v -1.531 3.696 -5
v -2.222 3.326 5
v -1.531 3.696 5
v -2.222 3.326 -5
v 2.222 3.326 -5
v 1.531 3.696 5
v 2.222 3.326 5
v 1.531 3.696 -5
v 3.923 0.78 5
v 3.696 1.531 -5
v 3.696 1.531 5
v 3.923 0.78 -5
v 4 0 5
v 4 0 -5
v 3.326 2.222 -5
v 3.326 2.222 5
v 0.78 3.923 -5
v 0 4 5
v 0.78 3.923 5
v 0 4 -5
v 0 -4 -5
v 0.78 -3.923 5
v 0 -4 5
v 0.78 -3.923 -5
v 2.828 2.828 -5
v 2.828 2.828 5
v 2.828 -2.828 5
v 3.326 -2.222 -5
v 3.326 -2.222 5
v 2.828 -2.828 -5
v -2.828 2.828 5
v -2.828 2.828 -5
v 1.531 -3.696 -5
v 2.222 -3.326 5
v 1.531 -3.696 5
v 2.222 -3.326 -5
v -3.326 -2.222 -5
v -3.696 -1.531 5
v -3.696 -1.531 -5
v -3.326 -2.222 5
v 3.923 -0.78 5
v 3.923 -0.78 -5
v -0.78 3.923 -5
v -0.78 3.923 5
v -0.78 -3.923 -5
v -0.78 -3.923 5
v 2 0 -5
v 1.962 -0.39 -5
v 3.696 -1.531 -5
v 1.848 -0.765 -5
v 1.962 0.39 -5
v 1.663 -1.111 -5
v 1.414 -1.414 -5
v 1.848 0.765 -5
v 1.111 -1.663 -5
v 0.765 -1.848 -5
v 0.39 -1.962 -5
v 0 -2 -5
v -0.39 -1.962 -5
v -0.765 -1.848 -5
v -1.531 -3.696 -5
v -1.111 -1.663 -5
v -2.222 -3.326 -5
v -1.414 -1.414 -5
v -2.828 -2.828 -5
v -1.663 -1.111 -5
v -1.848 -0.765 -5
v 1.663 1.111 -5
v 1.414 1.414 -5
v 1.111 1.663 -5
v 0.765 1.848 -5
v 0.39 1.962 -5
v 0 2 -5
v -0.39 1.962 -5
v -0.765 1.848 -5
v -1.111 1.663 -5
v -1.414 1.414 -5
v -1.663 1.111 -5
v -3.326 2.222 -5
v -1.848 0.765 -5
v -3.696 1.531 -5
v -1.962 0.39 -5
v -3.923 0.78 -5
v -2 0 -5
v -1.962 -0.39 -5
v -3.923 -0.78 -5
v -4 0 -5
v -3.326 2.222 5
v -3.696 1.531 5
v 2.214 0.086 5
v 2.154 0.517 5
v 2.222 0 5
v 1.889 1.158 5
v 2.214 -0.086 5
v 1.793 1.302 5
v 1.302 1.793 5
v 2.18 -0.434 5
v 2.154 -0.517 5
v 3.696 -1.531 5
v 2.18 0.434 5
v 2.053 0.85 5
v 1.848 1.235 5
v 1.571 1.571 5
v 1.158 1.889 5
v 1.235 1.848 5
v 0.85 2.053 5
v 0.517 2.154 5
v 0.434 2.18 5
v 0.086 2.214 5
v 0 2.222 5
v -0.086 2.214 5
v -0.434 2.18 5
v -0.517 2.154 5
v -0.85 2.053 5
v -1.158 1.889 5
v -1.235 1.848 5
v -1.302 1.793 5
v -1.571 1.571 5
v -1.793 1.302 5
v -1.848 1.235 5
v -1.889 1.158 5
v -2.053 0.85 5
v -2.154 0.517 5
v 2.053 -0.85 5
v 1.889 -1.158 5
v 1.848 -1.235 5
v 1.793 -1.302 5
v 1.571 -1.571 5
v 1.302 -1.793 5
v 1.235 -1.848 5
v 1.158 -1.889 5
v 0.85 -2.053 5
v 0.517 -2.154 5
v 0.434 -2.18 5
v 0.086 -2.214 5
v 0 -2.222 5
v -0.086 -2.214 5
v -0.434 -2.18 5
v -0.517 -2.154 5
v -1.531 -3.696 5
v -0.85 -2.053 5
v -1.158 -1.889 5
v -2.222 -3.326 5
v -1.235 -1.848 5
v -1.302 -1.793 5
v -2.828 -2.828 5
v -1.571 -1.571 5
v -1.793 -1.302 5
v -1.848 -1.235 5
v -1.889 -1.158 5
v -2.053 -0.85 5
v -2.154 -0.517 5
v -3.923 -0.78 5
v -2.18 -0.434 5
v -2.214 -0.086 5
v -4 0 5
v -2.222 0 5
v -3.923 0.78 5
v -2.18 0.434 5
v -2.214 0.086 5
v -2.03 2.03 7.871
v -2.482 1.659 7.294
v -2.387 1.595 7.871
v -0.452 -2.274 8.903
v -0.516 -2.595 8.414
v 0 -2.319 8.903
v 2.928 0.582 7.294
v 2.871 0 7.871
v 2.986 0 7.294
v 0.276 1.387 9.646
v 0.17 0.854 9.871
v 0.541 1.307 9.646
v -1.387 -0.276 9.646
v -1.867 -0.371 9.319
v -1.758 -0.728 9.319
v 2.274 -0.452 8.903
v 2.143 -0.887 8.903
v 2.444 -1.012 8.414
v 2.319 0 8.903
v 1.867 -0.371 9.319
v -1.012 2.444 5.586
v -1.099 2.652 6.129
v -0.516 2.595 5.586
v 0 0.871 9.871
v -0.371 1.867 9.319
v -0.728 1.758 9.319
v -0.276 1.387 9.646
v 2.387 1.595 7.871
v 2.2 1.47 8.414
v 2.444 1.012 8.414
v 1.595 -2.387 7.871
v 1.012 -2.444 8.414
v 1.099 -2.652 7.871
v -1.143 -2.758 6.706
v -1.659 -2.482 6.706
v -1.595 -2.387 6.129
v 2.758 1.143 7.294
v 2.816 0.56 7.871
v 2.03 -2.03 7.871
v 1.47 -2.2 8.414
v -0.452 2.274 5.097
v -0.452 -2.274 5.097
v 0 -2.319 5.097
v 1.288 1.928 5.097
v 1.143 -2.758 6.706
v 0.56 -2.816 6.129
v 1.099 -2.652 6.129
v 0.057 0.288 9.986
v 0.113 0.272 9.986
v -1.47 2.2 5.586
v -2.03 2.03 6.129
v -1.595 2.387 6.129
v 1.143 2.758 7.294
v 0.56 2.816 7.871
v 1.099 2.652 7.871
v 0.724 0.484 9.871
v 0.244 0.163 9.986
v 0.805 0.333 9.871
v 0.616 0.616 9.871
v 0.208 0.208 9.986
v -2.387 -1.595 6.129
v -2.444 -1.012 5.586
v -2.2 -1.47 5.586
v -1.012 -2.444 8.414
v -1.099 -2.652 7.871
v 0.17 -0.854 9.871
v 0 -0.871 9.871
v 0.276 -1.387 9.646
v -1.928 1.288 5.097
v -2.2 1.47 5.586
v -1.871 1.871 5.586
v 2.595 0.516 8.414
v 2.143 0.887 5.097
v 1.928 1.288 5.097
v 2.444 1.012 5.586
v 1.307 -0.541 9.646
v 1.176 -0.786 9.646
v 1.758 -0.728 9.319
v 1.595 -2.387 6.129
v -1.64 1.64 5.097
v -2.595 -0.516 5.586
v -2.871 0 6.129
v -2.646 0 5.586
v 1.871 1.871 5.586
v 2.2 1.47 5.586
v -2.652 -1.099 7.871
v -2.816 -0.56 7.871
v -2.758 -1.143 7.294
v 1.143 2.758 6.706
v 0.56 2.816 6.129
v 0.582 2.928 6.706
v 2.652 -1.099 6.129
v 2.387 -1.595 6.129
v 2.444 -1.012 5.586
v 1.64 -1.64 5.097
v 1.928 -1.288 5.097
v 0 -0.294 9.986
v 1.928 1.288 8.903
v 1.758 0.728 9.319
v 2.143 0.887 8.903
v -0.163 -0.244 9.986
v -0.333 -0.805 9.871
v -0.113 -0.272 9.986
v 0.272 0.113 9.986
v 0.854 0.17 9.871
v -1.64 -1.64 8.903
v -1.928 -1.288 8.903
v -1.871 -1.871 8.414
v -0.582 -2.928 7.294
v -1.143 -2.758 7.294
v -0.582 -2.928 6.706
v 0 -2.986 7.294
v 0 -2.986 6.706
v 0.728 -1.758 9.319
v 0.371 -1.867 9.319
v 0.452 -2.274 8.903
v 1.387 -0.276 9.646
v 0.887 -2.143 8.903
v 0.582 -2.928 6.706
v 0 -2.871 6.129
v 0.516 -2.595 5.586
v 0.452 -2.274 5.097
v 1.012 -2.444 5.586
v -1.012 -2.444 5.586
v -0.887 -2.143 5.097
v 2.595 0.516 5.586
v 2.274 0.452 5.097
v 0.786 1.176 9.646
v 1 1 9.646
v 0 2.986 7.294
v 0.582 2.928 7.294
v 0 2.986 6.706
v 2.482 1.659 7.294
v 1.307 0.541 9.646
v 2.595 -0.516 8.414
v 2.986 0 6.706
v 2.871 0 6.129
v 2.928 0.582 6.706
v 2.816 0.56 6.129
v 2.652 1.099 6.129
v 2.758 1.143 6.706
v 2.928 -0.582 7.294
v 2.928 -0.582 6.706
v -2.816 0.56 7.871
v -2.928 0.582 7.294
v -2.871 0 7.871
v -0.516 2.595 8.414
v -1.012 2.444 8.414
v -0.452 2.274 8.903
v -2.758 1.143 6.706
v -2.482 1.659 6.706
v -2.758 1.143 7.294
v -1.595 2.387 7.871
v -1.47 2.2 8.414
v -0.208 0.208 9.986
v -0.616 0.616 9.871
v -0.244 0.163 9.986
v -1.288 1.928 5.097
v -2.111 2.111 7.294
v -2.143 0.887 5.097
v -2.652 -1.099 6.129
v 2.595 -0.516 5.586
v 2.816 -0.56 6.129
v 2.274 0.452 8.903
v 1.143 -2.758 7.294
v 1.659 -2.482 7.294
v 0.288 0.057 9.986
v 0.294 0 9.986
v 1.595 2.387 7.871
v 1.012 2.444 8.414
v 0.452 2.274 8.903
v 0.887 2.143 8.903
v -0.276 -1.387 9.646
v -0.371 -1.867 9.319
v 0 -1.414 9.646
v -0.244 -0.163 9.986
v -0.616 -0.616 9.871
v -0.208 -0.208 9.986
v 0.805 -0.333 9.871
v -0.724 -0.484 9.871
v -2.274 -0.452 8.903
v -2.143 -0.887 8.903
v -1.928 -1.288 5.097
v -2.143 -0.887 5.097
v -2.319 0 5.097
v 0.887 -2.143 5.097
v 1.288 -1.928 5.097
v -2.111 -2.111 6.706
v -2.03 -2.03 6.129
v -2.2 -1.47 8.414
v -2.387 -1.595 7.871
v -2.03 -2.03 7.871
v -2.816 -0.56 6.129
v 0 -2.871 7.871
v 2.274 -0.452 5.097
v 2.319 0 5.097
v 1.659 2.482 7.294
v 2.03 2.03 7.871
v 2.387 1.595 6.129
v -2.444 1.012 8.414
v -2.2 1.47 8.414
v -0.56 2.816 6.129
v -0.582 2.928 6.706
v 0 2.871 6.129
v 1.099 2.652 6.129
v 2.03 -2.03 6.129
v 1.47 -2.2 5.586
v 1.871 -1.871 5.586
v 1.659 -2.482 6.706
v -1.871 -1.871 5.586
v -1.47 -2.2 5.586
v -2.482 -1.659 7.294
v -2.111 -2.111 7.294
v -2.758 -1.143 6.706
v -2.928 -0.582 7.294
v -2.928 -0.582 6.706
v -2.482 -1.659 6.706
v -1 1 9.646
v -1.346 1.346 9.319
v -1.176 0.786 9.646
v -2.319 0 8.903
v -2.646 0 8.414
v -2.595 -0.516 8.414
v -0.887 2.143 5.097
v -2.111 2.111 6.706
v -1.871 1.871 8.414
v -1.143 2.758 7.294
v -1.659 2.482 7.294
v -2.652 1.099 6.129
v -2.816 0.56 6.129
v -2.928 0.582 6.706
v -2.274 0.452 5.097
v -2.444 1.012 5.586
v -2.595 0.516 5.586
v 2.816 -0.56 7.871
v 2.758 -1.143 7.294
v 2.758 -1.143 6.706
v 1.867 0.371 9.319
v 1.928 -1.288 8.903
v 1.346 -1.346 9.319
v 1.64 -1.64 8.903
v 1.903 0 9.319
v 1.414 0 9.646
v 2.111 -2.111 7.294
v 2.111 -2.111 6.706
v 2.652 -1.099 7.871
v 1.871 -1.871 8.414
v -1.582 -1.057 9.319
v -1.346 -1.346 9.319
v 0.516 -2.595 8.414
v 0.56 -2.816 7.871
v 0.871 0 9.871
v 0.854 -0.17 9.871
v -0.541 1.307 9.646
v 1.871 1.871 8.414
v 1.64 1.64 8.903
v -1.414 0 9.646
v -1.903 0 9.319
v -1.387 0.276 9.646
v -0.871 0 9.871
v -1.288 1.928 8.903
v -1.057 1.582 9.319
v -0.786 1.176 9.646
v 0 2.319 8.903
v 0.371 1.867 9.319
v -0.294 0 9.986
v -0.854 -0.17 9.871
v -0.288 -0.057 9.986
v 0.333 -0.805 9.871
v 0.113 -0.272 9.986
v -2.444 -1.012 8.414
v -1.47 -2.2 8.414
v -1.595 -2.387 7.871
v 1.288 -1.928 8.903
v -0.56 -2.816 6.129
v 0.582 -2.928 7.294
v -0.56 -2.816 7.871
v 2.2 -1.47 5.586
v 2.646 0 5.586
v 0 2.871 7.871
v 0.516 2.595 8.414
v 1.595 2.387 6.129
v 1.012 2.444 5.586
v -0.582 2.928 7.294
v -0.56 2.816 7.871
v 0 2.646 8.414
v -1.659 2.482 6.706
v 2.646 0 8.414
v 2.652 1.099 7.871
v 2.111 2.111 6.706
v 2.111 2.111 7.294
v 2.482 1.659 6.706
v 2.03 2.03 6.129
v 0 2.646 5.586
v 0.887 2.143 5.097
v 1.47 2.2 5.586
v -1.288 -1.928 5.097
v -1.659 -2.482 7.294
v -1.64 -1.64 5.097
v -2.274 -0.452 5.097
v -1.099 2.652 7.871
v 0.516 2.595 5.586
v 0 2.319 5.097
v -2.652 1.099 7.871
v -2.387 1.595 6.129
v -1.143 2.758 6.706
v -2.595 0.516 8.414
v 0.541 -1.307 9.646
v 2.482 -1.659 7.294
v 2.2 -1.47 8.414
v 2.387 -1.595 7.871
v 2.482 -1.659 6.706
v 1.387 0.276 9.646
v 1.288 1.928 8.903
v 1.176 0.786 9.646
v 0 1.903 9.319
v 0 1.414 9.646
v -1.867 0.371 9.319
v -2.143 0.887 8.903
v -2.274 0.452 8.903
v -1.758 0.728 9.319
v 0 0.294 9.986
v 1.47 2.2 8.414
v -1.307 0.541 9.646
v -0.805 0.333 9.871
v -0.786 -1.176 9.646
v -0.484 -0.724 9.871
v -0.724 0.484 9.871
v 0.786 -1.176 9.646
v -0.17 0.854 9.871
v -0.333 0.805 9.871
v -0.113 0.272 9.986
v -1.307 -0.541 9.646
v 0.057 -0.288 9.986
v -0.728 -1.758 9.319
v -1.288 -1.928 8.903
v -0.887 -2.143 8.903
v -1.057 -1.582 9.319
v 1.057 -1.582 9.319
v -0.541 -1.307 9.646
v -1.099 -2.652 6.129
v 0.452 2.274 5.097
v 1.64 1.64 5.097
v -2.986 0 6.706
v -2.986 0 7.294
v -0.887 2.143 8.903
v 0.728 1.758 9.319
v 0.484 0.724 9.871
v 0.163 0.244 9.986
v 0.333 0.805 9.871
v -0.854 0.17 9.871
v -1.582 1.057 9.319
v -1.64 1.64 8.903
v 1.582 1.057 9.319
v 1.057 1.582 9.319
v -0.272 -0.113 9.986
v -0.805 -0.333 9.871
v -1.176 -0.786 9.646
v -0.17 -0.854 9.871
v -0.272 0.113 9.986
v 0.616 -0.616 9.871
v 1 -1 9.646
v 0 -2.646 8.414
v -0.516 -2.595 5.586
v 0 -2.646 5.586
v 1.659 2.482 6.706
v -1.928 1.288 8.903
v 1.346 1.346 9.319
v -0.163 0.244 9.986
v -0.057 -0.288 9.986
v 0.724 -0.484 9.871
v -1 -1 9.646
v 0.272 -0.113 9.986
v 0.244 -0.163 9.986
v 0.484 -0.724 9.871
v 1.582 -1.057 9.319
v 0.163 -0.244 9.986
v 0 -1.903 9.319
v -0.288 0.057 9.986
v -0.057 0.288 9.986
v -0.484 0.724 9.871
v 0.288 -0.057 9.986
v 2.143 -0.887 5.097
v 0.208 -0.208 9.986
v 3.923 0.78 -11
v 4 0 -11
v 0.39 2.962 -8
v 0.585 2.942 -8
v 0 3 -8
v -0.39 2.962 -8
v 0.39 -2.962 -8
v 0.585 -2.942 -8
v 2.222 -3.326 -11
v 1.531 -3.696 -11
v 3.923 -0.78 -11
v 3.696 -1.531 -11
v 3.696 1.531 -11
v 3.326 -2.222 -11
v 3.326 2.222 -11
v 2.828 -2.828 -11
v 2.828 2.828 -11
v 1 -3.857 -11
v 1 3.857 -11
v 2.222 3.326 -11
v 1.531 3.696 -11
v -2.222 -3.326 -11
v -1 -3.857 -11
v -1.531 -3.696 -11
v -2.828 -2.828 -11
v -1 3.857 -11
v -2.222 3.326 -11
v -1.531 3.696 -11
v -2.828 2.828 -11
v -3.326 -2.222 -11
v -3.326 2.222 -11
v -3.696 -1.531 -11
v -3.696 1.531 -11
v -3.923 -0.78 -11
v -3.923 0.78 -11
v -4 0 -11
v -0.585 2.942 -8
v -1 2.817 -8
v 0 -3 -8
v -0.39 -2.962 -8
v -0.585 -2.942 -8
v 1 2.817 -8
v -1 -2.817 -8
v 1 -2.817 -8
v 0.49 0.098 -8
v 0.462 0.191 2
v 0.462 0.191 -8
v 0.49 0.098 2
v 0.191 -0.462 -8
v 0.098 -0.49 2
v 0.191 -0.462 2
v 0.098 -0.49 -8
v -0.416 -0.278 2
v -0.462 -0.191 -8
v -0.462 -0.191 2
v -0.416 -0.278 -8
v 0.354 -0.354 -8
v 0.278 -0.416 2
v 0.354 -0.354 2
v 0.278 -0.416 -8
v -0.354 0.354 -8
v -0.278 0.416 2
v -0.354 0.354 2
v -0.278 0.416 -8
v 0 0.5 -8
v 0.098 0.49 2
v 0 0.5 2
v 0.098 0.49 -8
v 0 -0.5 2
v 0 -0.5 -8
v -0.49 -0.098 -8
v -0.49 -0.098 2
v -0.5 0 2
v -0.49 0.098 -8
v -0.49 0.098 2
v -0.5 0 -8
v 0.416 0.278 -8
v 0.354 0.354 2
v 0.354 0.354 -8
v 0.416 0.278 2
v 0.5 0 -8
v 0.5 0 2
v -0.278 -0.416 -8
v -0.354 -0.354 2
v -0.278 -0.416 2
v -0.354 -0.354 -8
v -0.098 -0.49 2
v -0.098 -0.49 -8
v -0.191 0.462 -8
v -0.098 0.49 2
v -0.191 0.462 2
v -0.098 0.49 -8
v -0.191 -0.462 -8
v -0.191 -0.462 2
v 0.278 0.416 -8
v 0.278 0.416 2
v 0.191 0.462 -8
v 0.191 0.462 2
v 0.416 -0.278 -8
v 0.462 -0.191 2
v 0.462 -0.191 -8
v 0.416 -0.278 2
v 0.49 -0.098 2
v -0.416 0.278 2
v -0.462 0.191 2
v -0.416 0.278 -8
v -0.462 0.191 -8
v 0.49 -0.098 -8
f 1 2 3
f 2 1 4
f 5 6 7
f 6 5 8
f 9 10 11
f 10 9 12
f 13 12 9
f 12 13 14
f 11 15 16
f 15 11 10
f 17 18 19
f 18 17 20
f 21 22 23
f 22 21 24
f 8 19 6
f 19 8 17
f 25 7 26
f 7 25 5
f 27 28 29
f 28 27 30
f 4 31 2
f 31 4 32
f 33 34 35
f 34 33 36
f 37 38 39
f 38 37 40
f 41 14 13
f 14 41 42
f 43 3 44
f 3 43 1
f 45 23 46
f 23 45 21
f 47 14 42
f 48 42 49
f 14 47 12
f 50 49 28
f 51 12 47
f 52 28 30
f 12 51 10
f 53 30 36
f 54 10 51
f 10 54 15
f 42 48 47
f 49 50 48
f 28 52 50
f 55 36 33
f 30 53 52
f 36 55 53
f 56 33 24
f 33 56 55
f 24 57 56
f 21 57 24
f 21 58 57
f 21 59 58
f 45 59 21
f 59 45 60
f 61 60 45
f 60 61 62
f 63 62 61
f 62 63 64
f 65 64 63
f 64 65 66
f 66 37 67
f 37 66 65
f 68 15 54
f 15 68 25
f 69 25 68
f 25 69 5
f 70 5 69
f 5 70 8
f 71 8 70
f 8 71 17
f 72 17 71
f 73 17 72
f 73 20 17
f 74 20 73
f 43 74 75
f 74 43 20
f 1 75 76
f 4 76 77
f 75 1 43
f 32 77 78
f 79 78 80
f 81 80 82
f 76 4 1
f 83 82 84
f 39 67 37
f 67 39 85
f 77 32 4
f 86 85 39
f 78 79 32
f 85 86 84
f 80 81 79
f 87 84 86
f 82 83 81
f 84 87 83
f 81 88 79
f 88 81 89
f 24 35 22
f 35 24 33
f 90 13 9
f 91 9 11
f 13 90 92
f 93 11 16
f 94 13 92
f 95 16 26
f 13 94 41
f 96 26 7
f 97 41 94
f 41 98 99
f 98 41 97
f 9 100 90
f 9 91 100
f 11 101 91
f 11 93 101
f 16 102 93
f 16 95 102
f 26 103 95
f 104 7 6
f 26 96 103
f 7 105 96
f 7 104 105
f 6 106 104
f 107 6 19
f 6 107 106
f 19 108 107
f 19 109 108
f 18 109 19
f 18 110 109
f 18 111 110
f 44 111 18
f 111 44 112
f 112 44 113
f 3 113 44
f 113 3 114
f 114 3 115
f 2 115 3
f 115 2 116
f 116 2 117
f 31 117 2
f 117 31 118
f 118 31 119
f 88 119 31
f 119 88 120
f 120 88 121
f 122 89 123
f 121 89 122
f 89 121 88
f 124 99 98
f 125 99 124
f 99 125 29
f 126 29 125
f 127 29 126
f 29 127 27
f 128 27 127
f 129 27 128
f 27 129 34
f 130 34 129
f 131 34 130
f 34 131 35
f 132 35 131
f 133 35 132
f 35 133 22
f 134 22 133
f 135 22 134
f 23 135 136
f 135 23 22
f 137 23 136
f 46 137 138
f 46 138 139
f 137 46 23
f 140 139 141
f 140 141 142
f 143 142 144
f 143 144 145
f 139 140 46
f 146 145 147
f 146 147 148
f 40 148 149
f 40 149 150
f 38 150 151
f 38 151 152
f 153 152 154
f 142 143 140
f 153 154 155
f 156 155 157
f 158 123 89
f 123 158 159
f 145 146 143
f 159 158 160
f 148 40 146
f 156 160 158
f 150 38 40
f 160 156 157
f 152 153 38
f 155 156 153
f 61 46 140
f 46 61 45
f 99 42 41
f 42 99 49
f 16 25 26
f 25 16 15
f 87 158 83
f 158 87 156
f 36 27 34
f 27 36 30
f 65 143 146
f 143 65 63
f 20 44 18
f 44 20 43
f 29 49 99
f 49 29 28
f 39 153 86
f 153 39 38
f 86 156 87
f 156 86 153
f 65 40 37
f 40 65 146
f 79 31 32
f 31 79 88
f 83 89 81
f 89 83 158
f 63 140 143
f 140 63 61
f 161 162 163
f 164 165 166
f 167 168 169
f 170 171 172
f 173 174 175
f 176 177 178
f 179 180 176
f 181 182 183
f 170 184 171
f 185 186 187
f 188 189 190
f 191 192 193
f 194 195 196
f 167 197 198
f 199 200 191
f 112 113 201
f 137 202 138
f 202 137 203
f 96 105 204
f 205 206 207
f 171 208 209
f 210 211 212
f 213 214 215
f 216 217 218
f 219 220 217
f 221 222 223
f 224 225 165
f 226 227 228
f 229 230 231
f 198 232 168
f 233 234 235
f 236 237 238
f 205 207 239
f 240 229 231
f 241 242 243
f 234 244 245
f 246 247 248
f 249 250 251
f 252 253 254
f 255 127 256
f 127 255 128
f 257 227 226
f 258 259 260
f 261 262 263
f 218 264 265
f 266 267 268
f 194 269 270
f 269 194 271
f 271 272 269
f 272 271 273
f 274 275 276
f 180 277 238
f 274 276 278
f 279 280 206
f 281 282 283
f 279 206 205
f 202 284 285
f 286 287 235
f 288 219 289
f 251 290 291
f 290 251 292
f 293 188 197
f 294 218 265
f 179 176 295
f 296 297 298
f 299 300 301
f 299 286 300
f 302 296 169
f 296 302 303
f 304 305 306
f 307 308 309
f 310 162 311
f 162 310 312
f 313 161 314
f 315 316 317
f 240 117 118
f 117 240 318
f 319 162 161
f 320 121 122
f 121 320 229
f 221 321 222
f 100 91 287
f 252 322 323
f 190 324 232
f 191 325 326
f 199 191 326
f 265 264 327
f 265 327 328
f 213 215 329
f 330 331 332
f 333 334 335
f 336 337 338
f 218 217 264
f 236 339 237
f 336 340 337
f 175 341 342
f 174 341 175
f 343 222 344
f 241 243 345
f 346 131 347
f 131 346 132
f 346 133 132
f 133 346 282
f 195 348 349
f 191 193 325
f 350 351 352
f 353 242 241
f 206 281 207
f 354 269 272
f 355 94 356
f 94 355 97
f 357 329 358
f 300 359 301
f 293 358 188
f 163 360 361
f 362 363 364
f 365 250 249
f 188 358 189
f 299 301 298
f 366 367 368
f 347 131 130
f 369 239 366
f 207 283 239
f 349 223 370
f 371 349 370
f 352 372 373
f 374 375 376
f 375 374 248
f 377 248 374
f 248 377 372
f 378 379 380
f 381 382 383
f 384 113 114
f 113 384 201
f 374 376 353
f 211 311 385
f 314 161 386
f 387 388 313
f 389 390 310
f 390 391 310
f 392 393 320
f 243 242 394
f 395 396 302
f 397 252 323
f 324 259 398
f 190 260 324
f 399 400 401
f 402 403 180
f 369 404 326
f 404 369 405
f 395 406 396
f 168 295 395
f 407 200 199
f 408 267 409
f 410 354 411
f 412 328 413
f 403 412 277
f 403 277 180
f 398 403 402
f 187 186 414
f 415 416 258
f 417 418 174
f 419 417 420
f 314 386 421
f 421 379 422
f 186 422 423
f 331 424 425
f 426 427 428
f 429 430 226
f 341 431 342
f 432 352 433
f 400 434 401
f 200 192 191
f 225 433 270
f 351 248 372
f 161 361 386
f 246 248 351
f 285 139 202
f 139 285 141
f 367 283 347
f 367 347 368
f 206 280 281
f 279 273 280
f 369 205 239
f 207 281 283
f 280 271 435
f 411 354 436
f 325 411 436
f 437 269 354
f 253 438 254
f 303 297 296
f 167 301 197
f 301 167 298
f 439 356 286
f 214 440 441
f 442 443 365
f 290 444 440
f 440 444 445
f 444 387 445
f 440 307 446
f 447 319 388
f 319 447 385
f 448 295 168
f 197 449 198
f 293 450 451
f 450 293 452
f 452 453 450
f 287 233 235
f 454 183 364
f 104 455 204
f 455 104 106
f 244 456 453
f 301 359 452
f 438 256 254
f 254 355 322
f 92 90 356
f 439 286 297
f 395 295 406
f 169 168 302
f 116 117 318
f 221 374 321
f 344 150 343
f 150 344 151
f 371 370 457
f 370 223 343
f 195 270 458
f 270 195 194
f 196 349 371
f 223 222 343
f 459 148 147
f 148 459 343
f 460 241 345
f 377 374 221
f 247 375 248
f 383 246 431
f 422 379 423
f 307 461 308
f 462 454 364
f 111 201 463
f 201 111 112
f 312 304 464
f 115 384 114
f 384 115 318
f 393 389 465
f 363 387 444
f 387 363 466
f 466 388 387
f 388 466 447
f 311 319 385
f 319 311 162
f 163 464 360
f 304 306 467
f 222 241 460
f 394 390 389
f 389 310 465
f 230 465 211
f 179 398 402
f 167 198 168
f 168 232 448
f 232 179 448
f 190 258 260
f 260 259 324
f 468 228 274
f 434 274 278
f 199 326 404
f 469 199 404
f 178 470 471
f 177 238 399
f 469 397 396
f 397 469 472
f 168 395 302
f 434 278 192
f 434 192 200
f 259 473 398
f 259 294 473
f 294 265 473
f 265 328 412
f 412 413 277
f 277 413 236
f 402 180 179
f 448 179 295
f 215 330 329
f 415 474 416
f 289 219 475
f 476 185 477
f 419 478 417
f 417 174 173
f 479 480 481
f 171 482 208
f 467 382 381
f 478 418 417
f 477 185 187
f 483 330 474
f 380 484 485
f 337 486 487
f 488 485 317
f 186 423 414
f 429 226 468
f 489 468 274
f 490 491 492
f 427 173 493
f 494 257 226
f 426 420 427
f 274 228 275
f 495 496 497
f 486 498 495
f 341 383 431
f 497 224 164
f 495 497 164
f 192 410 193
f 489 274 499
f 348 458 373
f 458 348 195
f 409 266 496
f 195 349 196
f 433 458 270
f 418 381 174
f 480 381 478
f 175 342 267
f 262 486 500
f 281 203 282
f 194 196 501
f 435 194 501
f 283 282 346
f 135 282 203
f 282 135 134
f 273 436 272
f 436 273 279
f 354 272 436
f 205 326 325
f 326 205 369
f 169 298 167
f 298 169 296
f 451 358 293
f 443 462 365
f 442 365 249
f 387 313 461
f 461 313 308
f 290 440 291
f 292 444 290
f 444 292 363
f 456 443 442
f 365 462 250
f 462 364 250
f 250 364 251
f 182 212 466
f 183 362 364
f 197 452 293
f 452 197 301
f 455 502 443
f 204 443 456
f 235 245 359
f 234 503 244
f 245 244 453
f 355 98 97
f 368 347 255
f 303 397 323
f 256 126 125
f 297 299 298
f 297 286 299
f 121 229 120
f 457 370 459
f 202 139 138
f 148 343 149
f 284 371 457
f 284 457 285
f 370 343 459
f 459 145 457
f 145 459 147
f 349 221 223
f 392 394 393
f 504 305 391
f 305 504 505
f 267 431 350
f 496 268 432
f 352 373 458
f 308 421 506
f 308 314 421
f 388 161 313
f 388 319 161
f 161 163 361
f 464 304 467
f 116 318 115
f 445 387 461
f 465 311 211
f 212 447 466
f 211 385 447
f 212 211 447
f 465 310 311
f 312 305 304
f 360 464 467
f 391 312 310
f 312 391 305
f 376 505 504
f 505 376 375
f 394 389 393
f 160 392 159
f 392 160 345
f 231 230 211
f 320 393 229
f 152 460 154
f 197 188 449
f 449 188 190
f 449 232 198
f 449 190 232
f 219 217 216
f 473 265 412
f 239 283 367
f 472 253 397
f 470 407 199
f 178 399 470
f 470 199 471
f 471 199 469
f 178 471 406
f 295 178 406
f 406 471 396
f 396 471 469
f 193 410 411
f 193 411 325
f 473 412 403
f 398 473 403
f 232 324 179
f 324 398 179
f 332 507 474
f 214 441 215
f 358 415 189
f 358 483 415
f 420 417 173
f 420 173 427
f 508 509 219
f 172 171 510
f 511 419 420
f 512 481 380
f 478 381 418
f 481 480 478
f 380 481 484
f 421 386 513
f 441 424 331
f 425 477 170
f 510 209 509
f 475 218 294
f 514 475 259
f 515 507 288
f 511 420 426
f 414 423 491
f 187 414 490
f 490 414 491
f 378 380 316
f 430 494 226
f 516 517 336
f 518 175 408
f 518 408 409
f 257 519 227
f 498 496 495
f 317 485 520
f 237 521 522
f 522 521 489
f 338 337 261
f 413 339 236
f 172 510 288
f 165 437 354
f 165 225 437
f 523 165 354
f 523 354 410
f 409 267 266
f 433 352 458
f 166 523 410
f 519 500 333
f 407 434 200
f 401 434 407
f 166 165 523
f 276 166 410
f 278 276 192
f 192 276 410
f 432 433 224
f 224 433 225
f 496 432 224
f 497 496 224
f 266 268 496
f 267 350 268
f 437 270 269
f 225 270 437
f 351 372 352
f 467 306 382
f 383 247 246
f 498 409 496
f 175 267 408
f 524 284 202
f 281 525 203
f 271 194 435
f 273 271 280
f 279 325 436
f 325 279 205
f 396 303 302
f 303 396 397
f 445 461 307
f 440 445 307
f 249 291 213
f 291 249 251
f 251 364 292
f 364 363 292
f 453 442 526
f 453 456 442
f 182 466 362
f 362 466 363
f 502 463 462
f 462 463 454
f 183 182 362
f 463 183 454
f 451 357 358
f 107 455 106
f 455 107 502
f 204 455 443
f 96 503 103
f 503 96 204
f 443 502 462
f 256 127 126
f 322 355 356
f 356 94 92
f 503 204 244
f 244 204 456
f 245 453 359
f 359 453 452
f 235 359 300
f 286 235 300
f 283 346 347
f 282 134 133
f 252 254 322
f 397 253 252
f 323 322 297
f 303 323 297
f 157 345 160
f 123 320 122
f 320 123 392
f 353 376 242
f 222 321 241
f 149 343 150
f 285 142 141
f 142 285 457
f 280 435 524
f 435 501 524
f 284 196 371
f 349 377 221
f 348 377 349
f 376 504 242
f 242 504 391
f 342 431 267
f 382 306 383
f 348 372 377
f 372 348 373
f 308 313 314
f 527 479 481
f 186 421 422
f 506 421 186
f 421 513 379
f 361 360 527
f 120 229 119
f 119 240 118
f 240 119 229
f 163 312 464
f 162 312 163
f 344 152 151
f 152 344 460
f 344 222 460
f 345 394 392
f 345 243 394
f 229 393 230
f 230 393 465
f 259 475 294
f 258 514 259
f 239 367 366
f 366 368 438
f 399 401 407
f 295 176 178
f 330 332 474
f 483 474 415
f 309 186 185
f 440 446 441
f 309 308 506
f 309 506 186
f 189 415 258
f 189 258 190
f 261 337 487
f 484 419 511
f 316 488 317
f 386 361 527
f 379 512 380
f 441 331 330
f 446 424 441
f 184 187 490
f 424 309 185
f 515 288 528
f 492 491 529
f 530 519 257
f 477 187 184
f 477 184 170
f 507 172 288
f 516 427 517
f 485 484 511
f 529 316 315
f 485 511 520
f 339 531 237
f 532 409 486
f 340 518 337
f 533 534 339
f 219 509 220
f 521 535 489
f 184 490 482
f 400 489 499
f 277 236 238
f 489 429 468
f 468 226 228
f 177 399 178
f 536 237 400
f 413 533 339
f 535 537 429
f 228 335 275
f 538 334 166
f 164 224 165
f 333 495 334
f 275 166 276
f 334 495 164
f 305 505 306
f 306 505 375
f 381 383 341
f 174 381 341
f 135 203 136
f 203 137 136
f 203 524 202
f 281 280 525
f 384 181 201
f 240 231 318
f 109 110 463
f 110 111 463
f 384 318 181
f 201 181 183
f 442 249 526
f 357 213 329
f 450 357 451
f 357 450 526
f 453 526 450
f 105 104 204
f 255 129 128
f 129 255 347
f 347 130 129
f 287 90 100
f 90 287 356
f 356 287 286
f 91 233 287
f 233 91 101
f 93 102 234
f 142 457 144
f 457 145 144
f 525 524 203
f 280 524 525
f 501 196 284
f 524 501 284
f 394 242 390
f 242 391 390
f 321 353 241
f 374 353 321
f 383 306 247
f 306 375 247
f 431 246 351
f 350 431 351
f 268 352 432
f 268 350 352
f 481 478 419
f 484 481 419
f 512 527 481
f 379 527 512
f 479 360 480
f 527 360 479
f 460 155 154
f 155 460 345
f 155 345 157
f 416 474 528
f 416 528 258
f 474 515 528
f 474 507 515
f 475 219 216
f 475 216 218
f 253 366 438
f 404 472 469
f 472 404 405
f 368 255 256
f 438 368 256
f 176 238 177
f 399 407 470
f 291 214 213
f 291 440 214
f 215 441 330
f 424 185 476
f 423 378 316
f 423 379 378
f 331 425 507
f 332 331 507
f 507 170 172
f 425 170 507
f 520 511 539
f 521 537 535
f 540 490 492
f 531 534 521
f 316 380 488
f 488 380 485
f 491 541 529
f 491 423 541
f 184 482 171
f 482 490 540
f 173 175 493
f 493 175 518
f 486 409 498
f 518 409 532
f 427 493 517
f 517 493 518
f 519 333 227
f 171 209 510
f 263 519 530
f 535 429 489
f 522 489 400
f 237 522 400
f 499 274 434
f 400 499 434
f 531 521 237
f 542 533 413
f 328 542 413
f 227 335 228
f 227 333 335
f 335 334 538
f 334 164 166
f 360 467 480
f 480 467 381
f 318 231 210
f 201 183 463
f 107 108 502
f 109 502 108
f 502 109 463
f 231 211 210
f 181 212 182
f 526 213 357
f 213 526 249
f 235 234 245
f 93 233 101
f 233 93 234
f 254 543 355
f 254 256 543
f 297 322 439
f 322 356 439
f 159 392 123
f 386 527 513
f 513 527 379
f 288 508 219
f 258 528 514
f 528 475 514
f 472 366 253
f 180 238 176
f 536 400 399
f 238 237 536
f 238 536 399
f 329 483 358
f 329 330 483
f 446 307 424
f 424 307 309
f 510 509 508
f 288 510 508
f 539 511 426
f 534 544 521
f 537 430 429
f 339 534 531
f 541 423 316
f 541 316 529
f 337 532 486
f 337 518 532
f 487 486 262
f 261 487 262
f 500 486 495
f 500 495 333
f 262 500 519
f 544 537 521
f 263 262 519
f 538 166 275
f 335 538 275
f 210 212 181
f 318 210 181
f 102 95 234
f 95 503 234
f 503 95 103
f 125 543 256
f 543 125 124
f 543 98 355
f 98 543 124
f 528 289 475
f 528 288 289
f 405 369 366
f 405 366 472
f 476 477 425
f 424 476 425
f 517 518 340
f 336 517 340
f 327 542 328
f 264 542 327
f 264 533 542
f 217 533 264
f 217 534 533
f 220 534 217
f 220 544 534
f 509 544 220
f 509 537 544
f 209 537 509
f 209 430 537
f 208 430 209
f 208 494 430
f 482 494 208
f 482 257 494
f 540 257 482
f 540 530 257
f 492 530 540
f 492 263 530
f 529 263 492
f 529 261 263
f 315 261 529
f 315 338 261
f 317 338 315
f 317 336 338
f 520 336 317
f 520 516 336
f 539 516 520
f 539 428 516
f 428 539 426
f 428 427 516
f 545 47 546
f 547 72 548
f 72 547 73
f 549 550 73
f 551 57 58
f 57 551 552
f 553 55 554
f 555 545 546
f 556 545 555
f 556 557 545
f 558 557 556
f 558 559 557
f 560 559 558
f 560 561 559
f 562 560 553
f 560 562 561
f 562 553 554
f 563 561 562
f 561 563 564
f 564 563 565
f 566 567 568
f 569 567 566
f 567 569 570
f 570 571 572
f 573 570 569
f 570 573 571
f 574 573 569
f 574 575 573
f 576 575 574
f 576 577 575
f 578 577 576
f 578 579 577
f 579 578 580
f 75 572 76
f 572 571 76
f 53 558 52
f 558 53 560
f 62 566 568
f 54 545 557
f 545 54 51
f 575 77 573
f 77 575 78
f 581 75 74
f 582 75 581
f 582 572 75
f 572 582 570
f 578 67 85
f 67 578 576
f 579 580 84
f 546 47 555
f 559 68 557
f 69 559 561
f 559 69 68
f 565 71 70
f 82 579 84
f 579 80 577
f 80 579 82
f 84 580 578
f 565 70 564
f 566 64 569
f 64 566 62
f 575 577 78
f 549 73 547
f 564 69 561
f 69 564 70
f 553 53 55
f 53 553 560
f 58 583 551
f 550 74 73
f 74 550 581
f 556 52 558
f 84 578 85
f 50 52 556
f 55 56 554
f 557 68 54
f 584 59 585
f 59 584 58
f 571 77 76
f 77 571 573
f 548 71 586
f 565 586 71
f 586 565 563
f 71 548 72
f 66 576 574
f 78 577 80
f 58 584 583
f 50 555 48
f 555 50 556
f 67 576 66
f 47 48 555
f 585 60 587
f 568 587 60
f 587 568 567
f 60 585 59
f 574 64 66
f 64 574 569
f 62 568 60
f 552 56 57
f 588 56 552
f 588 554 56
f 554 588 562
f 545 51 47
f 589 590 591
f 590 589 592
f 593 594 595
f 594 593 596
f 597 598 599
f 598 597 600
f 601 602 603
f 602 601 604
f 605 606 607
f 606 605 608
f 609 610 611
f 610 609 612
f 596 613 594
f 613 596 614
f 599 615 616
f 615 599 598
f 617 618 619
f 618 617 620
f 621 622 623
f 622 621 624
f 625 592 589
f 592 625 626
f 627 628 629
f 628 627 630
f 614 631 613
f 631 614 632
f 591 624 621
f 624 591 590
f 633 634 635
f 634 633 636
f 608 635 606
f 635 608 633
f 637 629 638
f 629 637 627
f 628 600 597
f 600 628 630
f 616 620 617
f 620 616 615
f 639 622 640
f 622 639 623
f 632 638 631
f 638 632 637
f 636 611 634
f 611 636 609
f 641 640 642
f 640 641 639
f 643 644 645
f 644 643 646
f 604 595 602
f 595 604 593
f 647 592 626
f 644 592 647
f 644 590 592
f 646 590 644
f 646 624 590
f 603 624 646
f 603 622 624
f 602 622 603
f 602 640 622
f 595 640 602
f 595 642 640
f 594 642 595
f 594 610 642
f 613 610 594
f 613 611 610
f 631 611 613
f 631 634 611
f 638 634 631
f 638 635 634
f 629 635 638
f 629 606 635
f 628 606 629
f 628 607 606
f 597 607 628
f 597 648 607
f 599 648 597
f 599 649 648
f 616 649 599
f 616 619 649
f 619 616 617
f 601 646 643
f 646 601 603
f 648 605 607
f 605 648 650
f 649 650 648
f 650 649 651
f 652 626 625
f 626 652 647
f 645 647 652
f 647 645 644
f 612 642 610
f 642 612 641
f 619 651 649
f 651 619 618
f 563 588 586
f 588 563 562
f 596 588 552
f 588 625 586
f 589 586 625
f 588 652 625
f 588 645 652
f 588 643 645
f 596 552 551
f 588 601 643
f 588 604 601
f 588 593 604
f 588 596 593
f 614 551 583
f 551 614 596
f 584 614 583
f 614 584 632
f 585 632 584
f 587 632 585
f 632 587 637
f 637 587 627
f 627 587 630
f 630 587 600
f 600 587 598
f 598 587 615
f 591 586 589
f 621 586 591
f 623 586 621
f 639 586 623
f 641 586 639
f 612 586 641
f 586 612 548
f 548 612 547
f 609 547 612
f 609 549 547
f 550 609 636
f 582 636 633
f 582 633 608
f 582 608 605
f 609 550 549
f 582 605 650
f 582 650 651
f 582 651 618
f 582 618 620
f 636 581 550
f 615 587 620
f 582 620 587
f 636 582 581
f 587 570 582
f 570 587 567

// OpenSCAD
// COBRA-Snap Tendon Coupler
// Ball-end quick connect for Dyneema line

$fn = 32;

module tendon_coupler() {
    difference() {
        union() {
            // Coupler body
            cylinder(h=10, d=8, center=true);
            
            // Ball end
            translate([0, 0, 7])
            sphere(d=6);
            
            // Strain relief
            translate([0, 0, -8])
            cylinder(h=6, d1=8, d2=4, center=true);
        }
        
        // Tendon channel
        translate([0, 0, -8])
        cylinder(h=20, d=1, center=true);
        
        // Crimp slot
        translate([0, 0, -10])
        cube([2, 8, 4], center=true);
    }
}

tendon_coupler();
